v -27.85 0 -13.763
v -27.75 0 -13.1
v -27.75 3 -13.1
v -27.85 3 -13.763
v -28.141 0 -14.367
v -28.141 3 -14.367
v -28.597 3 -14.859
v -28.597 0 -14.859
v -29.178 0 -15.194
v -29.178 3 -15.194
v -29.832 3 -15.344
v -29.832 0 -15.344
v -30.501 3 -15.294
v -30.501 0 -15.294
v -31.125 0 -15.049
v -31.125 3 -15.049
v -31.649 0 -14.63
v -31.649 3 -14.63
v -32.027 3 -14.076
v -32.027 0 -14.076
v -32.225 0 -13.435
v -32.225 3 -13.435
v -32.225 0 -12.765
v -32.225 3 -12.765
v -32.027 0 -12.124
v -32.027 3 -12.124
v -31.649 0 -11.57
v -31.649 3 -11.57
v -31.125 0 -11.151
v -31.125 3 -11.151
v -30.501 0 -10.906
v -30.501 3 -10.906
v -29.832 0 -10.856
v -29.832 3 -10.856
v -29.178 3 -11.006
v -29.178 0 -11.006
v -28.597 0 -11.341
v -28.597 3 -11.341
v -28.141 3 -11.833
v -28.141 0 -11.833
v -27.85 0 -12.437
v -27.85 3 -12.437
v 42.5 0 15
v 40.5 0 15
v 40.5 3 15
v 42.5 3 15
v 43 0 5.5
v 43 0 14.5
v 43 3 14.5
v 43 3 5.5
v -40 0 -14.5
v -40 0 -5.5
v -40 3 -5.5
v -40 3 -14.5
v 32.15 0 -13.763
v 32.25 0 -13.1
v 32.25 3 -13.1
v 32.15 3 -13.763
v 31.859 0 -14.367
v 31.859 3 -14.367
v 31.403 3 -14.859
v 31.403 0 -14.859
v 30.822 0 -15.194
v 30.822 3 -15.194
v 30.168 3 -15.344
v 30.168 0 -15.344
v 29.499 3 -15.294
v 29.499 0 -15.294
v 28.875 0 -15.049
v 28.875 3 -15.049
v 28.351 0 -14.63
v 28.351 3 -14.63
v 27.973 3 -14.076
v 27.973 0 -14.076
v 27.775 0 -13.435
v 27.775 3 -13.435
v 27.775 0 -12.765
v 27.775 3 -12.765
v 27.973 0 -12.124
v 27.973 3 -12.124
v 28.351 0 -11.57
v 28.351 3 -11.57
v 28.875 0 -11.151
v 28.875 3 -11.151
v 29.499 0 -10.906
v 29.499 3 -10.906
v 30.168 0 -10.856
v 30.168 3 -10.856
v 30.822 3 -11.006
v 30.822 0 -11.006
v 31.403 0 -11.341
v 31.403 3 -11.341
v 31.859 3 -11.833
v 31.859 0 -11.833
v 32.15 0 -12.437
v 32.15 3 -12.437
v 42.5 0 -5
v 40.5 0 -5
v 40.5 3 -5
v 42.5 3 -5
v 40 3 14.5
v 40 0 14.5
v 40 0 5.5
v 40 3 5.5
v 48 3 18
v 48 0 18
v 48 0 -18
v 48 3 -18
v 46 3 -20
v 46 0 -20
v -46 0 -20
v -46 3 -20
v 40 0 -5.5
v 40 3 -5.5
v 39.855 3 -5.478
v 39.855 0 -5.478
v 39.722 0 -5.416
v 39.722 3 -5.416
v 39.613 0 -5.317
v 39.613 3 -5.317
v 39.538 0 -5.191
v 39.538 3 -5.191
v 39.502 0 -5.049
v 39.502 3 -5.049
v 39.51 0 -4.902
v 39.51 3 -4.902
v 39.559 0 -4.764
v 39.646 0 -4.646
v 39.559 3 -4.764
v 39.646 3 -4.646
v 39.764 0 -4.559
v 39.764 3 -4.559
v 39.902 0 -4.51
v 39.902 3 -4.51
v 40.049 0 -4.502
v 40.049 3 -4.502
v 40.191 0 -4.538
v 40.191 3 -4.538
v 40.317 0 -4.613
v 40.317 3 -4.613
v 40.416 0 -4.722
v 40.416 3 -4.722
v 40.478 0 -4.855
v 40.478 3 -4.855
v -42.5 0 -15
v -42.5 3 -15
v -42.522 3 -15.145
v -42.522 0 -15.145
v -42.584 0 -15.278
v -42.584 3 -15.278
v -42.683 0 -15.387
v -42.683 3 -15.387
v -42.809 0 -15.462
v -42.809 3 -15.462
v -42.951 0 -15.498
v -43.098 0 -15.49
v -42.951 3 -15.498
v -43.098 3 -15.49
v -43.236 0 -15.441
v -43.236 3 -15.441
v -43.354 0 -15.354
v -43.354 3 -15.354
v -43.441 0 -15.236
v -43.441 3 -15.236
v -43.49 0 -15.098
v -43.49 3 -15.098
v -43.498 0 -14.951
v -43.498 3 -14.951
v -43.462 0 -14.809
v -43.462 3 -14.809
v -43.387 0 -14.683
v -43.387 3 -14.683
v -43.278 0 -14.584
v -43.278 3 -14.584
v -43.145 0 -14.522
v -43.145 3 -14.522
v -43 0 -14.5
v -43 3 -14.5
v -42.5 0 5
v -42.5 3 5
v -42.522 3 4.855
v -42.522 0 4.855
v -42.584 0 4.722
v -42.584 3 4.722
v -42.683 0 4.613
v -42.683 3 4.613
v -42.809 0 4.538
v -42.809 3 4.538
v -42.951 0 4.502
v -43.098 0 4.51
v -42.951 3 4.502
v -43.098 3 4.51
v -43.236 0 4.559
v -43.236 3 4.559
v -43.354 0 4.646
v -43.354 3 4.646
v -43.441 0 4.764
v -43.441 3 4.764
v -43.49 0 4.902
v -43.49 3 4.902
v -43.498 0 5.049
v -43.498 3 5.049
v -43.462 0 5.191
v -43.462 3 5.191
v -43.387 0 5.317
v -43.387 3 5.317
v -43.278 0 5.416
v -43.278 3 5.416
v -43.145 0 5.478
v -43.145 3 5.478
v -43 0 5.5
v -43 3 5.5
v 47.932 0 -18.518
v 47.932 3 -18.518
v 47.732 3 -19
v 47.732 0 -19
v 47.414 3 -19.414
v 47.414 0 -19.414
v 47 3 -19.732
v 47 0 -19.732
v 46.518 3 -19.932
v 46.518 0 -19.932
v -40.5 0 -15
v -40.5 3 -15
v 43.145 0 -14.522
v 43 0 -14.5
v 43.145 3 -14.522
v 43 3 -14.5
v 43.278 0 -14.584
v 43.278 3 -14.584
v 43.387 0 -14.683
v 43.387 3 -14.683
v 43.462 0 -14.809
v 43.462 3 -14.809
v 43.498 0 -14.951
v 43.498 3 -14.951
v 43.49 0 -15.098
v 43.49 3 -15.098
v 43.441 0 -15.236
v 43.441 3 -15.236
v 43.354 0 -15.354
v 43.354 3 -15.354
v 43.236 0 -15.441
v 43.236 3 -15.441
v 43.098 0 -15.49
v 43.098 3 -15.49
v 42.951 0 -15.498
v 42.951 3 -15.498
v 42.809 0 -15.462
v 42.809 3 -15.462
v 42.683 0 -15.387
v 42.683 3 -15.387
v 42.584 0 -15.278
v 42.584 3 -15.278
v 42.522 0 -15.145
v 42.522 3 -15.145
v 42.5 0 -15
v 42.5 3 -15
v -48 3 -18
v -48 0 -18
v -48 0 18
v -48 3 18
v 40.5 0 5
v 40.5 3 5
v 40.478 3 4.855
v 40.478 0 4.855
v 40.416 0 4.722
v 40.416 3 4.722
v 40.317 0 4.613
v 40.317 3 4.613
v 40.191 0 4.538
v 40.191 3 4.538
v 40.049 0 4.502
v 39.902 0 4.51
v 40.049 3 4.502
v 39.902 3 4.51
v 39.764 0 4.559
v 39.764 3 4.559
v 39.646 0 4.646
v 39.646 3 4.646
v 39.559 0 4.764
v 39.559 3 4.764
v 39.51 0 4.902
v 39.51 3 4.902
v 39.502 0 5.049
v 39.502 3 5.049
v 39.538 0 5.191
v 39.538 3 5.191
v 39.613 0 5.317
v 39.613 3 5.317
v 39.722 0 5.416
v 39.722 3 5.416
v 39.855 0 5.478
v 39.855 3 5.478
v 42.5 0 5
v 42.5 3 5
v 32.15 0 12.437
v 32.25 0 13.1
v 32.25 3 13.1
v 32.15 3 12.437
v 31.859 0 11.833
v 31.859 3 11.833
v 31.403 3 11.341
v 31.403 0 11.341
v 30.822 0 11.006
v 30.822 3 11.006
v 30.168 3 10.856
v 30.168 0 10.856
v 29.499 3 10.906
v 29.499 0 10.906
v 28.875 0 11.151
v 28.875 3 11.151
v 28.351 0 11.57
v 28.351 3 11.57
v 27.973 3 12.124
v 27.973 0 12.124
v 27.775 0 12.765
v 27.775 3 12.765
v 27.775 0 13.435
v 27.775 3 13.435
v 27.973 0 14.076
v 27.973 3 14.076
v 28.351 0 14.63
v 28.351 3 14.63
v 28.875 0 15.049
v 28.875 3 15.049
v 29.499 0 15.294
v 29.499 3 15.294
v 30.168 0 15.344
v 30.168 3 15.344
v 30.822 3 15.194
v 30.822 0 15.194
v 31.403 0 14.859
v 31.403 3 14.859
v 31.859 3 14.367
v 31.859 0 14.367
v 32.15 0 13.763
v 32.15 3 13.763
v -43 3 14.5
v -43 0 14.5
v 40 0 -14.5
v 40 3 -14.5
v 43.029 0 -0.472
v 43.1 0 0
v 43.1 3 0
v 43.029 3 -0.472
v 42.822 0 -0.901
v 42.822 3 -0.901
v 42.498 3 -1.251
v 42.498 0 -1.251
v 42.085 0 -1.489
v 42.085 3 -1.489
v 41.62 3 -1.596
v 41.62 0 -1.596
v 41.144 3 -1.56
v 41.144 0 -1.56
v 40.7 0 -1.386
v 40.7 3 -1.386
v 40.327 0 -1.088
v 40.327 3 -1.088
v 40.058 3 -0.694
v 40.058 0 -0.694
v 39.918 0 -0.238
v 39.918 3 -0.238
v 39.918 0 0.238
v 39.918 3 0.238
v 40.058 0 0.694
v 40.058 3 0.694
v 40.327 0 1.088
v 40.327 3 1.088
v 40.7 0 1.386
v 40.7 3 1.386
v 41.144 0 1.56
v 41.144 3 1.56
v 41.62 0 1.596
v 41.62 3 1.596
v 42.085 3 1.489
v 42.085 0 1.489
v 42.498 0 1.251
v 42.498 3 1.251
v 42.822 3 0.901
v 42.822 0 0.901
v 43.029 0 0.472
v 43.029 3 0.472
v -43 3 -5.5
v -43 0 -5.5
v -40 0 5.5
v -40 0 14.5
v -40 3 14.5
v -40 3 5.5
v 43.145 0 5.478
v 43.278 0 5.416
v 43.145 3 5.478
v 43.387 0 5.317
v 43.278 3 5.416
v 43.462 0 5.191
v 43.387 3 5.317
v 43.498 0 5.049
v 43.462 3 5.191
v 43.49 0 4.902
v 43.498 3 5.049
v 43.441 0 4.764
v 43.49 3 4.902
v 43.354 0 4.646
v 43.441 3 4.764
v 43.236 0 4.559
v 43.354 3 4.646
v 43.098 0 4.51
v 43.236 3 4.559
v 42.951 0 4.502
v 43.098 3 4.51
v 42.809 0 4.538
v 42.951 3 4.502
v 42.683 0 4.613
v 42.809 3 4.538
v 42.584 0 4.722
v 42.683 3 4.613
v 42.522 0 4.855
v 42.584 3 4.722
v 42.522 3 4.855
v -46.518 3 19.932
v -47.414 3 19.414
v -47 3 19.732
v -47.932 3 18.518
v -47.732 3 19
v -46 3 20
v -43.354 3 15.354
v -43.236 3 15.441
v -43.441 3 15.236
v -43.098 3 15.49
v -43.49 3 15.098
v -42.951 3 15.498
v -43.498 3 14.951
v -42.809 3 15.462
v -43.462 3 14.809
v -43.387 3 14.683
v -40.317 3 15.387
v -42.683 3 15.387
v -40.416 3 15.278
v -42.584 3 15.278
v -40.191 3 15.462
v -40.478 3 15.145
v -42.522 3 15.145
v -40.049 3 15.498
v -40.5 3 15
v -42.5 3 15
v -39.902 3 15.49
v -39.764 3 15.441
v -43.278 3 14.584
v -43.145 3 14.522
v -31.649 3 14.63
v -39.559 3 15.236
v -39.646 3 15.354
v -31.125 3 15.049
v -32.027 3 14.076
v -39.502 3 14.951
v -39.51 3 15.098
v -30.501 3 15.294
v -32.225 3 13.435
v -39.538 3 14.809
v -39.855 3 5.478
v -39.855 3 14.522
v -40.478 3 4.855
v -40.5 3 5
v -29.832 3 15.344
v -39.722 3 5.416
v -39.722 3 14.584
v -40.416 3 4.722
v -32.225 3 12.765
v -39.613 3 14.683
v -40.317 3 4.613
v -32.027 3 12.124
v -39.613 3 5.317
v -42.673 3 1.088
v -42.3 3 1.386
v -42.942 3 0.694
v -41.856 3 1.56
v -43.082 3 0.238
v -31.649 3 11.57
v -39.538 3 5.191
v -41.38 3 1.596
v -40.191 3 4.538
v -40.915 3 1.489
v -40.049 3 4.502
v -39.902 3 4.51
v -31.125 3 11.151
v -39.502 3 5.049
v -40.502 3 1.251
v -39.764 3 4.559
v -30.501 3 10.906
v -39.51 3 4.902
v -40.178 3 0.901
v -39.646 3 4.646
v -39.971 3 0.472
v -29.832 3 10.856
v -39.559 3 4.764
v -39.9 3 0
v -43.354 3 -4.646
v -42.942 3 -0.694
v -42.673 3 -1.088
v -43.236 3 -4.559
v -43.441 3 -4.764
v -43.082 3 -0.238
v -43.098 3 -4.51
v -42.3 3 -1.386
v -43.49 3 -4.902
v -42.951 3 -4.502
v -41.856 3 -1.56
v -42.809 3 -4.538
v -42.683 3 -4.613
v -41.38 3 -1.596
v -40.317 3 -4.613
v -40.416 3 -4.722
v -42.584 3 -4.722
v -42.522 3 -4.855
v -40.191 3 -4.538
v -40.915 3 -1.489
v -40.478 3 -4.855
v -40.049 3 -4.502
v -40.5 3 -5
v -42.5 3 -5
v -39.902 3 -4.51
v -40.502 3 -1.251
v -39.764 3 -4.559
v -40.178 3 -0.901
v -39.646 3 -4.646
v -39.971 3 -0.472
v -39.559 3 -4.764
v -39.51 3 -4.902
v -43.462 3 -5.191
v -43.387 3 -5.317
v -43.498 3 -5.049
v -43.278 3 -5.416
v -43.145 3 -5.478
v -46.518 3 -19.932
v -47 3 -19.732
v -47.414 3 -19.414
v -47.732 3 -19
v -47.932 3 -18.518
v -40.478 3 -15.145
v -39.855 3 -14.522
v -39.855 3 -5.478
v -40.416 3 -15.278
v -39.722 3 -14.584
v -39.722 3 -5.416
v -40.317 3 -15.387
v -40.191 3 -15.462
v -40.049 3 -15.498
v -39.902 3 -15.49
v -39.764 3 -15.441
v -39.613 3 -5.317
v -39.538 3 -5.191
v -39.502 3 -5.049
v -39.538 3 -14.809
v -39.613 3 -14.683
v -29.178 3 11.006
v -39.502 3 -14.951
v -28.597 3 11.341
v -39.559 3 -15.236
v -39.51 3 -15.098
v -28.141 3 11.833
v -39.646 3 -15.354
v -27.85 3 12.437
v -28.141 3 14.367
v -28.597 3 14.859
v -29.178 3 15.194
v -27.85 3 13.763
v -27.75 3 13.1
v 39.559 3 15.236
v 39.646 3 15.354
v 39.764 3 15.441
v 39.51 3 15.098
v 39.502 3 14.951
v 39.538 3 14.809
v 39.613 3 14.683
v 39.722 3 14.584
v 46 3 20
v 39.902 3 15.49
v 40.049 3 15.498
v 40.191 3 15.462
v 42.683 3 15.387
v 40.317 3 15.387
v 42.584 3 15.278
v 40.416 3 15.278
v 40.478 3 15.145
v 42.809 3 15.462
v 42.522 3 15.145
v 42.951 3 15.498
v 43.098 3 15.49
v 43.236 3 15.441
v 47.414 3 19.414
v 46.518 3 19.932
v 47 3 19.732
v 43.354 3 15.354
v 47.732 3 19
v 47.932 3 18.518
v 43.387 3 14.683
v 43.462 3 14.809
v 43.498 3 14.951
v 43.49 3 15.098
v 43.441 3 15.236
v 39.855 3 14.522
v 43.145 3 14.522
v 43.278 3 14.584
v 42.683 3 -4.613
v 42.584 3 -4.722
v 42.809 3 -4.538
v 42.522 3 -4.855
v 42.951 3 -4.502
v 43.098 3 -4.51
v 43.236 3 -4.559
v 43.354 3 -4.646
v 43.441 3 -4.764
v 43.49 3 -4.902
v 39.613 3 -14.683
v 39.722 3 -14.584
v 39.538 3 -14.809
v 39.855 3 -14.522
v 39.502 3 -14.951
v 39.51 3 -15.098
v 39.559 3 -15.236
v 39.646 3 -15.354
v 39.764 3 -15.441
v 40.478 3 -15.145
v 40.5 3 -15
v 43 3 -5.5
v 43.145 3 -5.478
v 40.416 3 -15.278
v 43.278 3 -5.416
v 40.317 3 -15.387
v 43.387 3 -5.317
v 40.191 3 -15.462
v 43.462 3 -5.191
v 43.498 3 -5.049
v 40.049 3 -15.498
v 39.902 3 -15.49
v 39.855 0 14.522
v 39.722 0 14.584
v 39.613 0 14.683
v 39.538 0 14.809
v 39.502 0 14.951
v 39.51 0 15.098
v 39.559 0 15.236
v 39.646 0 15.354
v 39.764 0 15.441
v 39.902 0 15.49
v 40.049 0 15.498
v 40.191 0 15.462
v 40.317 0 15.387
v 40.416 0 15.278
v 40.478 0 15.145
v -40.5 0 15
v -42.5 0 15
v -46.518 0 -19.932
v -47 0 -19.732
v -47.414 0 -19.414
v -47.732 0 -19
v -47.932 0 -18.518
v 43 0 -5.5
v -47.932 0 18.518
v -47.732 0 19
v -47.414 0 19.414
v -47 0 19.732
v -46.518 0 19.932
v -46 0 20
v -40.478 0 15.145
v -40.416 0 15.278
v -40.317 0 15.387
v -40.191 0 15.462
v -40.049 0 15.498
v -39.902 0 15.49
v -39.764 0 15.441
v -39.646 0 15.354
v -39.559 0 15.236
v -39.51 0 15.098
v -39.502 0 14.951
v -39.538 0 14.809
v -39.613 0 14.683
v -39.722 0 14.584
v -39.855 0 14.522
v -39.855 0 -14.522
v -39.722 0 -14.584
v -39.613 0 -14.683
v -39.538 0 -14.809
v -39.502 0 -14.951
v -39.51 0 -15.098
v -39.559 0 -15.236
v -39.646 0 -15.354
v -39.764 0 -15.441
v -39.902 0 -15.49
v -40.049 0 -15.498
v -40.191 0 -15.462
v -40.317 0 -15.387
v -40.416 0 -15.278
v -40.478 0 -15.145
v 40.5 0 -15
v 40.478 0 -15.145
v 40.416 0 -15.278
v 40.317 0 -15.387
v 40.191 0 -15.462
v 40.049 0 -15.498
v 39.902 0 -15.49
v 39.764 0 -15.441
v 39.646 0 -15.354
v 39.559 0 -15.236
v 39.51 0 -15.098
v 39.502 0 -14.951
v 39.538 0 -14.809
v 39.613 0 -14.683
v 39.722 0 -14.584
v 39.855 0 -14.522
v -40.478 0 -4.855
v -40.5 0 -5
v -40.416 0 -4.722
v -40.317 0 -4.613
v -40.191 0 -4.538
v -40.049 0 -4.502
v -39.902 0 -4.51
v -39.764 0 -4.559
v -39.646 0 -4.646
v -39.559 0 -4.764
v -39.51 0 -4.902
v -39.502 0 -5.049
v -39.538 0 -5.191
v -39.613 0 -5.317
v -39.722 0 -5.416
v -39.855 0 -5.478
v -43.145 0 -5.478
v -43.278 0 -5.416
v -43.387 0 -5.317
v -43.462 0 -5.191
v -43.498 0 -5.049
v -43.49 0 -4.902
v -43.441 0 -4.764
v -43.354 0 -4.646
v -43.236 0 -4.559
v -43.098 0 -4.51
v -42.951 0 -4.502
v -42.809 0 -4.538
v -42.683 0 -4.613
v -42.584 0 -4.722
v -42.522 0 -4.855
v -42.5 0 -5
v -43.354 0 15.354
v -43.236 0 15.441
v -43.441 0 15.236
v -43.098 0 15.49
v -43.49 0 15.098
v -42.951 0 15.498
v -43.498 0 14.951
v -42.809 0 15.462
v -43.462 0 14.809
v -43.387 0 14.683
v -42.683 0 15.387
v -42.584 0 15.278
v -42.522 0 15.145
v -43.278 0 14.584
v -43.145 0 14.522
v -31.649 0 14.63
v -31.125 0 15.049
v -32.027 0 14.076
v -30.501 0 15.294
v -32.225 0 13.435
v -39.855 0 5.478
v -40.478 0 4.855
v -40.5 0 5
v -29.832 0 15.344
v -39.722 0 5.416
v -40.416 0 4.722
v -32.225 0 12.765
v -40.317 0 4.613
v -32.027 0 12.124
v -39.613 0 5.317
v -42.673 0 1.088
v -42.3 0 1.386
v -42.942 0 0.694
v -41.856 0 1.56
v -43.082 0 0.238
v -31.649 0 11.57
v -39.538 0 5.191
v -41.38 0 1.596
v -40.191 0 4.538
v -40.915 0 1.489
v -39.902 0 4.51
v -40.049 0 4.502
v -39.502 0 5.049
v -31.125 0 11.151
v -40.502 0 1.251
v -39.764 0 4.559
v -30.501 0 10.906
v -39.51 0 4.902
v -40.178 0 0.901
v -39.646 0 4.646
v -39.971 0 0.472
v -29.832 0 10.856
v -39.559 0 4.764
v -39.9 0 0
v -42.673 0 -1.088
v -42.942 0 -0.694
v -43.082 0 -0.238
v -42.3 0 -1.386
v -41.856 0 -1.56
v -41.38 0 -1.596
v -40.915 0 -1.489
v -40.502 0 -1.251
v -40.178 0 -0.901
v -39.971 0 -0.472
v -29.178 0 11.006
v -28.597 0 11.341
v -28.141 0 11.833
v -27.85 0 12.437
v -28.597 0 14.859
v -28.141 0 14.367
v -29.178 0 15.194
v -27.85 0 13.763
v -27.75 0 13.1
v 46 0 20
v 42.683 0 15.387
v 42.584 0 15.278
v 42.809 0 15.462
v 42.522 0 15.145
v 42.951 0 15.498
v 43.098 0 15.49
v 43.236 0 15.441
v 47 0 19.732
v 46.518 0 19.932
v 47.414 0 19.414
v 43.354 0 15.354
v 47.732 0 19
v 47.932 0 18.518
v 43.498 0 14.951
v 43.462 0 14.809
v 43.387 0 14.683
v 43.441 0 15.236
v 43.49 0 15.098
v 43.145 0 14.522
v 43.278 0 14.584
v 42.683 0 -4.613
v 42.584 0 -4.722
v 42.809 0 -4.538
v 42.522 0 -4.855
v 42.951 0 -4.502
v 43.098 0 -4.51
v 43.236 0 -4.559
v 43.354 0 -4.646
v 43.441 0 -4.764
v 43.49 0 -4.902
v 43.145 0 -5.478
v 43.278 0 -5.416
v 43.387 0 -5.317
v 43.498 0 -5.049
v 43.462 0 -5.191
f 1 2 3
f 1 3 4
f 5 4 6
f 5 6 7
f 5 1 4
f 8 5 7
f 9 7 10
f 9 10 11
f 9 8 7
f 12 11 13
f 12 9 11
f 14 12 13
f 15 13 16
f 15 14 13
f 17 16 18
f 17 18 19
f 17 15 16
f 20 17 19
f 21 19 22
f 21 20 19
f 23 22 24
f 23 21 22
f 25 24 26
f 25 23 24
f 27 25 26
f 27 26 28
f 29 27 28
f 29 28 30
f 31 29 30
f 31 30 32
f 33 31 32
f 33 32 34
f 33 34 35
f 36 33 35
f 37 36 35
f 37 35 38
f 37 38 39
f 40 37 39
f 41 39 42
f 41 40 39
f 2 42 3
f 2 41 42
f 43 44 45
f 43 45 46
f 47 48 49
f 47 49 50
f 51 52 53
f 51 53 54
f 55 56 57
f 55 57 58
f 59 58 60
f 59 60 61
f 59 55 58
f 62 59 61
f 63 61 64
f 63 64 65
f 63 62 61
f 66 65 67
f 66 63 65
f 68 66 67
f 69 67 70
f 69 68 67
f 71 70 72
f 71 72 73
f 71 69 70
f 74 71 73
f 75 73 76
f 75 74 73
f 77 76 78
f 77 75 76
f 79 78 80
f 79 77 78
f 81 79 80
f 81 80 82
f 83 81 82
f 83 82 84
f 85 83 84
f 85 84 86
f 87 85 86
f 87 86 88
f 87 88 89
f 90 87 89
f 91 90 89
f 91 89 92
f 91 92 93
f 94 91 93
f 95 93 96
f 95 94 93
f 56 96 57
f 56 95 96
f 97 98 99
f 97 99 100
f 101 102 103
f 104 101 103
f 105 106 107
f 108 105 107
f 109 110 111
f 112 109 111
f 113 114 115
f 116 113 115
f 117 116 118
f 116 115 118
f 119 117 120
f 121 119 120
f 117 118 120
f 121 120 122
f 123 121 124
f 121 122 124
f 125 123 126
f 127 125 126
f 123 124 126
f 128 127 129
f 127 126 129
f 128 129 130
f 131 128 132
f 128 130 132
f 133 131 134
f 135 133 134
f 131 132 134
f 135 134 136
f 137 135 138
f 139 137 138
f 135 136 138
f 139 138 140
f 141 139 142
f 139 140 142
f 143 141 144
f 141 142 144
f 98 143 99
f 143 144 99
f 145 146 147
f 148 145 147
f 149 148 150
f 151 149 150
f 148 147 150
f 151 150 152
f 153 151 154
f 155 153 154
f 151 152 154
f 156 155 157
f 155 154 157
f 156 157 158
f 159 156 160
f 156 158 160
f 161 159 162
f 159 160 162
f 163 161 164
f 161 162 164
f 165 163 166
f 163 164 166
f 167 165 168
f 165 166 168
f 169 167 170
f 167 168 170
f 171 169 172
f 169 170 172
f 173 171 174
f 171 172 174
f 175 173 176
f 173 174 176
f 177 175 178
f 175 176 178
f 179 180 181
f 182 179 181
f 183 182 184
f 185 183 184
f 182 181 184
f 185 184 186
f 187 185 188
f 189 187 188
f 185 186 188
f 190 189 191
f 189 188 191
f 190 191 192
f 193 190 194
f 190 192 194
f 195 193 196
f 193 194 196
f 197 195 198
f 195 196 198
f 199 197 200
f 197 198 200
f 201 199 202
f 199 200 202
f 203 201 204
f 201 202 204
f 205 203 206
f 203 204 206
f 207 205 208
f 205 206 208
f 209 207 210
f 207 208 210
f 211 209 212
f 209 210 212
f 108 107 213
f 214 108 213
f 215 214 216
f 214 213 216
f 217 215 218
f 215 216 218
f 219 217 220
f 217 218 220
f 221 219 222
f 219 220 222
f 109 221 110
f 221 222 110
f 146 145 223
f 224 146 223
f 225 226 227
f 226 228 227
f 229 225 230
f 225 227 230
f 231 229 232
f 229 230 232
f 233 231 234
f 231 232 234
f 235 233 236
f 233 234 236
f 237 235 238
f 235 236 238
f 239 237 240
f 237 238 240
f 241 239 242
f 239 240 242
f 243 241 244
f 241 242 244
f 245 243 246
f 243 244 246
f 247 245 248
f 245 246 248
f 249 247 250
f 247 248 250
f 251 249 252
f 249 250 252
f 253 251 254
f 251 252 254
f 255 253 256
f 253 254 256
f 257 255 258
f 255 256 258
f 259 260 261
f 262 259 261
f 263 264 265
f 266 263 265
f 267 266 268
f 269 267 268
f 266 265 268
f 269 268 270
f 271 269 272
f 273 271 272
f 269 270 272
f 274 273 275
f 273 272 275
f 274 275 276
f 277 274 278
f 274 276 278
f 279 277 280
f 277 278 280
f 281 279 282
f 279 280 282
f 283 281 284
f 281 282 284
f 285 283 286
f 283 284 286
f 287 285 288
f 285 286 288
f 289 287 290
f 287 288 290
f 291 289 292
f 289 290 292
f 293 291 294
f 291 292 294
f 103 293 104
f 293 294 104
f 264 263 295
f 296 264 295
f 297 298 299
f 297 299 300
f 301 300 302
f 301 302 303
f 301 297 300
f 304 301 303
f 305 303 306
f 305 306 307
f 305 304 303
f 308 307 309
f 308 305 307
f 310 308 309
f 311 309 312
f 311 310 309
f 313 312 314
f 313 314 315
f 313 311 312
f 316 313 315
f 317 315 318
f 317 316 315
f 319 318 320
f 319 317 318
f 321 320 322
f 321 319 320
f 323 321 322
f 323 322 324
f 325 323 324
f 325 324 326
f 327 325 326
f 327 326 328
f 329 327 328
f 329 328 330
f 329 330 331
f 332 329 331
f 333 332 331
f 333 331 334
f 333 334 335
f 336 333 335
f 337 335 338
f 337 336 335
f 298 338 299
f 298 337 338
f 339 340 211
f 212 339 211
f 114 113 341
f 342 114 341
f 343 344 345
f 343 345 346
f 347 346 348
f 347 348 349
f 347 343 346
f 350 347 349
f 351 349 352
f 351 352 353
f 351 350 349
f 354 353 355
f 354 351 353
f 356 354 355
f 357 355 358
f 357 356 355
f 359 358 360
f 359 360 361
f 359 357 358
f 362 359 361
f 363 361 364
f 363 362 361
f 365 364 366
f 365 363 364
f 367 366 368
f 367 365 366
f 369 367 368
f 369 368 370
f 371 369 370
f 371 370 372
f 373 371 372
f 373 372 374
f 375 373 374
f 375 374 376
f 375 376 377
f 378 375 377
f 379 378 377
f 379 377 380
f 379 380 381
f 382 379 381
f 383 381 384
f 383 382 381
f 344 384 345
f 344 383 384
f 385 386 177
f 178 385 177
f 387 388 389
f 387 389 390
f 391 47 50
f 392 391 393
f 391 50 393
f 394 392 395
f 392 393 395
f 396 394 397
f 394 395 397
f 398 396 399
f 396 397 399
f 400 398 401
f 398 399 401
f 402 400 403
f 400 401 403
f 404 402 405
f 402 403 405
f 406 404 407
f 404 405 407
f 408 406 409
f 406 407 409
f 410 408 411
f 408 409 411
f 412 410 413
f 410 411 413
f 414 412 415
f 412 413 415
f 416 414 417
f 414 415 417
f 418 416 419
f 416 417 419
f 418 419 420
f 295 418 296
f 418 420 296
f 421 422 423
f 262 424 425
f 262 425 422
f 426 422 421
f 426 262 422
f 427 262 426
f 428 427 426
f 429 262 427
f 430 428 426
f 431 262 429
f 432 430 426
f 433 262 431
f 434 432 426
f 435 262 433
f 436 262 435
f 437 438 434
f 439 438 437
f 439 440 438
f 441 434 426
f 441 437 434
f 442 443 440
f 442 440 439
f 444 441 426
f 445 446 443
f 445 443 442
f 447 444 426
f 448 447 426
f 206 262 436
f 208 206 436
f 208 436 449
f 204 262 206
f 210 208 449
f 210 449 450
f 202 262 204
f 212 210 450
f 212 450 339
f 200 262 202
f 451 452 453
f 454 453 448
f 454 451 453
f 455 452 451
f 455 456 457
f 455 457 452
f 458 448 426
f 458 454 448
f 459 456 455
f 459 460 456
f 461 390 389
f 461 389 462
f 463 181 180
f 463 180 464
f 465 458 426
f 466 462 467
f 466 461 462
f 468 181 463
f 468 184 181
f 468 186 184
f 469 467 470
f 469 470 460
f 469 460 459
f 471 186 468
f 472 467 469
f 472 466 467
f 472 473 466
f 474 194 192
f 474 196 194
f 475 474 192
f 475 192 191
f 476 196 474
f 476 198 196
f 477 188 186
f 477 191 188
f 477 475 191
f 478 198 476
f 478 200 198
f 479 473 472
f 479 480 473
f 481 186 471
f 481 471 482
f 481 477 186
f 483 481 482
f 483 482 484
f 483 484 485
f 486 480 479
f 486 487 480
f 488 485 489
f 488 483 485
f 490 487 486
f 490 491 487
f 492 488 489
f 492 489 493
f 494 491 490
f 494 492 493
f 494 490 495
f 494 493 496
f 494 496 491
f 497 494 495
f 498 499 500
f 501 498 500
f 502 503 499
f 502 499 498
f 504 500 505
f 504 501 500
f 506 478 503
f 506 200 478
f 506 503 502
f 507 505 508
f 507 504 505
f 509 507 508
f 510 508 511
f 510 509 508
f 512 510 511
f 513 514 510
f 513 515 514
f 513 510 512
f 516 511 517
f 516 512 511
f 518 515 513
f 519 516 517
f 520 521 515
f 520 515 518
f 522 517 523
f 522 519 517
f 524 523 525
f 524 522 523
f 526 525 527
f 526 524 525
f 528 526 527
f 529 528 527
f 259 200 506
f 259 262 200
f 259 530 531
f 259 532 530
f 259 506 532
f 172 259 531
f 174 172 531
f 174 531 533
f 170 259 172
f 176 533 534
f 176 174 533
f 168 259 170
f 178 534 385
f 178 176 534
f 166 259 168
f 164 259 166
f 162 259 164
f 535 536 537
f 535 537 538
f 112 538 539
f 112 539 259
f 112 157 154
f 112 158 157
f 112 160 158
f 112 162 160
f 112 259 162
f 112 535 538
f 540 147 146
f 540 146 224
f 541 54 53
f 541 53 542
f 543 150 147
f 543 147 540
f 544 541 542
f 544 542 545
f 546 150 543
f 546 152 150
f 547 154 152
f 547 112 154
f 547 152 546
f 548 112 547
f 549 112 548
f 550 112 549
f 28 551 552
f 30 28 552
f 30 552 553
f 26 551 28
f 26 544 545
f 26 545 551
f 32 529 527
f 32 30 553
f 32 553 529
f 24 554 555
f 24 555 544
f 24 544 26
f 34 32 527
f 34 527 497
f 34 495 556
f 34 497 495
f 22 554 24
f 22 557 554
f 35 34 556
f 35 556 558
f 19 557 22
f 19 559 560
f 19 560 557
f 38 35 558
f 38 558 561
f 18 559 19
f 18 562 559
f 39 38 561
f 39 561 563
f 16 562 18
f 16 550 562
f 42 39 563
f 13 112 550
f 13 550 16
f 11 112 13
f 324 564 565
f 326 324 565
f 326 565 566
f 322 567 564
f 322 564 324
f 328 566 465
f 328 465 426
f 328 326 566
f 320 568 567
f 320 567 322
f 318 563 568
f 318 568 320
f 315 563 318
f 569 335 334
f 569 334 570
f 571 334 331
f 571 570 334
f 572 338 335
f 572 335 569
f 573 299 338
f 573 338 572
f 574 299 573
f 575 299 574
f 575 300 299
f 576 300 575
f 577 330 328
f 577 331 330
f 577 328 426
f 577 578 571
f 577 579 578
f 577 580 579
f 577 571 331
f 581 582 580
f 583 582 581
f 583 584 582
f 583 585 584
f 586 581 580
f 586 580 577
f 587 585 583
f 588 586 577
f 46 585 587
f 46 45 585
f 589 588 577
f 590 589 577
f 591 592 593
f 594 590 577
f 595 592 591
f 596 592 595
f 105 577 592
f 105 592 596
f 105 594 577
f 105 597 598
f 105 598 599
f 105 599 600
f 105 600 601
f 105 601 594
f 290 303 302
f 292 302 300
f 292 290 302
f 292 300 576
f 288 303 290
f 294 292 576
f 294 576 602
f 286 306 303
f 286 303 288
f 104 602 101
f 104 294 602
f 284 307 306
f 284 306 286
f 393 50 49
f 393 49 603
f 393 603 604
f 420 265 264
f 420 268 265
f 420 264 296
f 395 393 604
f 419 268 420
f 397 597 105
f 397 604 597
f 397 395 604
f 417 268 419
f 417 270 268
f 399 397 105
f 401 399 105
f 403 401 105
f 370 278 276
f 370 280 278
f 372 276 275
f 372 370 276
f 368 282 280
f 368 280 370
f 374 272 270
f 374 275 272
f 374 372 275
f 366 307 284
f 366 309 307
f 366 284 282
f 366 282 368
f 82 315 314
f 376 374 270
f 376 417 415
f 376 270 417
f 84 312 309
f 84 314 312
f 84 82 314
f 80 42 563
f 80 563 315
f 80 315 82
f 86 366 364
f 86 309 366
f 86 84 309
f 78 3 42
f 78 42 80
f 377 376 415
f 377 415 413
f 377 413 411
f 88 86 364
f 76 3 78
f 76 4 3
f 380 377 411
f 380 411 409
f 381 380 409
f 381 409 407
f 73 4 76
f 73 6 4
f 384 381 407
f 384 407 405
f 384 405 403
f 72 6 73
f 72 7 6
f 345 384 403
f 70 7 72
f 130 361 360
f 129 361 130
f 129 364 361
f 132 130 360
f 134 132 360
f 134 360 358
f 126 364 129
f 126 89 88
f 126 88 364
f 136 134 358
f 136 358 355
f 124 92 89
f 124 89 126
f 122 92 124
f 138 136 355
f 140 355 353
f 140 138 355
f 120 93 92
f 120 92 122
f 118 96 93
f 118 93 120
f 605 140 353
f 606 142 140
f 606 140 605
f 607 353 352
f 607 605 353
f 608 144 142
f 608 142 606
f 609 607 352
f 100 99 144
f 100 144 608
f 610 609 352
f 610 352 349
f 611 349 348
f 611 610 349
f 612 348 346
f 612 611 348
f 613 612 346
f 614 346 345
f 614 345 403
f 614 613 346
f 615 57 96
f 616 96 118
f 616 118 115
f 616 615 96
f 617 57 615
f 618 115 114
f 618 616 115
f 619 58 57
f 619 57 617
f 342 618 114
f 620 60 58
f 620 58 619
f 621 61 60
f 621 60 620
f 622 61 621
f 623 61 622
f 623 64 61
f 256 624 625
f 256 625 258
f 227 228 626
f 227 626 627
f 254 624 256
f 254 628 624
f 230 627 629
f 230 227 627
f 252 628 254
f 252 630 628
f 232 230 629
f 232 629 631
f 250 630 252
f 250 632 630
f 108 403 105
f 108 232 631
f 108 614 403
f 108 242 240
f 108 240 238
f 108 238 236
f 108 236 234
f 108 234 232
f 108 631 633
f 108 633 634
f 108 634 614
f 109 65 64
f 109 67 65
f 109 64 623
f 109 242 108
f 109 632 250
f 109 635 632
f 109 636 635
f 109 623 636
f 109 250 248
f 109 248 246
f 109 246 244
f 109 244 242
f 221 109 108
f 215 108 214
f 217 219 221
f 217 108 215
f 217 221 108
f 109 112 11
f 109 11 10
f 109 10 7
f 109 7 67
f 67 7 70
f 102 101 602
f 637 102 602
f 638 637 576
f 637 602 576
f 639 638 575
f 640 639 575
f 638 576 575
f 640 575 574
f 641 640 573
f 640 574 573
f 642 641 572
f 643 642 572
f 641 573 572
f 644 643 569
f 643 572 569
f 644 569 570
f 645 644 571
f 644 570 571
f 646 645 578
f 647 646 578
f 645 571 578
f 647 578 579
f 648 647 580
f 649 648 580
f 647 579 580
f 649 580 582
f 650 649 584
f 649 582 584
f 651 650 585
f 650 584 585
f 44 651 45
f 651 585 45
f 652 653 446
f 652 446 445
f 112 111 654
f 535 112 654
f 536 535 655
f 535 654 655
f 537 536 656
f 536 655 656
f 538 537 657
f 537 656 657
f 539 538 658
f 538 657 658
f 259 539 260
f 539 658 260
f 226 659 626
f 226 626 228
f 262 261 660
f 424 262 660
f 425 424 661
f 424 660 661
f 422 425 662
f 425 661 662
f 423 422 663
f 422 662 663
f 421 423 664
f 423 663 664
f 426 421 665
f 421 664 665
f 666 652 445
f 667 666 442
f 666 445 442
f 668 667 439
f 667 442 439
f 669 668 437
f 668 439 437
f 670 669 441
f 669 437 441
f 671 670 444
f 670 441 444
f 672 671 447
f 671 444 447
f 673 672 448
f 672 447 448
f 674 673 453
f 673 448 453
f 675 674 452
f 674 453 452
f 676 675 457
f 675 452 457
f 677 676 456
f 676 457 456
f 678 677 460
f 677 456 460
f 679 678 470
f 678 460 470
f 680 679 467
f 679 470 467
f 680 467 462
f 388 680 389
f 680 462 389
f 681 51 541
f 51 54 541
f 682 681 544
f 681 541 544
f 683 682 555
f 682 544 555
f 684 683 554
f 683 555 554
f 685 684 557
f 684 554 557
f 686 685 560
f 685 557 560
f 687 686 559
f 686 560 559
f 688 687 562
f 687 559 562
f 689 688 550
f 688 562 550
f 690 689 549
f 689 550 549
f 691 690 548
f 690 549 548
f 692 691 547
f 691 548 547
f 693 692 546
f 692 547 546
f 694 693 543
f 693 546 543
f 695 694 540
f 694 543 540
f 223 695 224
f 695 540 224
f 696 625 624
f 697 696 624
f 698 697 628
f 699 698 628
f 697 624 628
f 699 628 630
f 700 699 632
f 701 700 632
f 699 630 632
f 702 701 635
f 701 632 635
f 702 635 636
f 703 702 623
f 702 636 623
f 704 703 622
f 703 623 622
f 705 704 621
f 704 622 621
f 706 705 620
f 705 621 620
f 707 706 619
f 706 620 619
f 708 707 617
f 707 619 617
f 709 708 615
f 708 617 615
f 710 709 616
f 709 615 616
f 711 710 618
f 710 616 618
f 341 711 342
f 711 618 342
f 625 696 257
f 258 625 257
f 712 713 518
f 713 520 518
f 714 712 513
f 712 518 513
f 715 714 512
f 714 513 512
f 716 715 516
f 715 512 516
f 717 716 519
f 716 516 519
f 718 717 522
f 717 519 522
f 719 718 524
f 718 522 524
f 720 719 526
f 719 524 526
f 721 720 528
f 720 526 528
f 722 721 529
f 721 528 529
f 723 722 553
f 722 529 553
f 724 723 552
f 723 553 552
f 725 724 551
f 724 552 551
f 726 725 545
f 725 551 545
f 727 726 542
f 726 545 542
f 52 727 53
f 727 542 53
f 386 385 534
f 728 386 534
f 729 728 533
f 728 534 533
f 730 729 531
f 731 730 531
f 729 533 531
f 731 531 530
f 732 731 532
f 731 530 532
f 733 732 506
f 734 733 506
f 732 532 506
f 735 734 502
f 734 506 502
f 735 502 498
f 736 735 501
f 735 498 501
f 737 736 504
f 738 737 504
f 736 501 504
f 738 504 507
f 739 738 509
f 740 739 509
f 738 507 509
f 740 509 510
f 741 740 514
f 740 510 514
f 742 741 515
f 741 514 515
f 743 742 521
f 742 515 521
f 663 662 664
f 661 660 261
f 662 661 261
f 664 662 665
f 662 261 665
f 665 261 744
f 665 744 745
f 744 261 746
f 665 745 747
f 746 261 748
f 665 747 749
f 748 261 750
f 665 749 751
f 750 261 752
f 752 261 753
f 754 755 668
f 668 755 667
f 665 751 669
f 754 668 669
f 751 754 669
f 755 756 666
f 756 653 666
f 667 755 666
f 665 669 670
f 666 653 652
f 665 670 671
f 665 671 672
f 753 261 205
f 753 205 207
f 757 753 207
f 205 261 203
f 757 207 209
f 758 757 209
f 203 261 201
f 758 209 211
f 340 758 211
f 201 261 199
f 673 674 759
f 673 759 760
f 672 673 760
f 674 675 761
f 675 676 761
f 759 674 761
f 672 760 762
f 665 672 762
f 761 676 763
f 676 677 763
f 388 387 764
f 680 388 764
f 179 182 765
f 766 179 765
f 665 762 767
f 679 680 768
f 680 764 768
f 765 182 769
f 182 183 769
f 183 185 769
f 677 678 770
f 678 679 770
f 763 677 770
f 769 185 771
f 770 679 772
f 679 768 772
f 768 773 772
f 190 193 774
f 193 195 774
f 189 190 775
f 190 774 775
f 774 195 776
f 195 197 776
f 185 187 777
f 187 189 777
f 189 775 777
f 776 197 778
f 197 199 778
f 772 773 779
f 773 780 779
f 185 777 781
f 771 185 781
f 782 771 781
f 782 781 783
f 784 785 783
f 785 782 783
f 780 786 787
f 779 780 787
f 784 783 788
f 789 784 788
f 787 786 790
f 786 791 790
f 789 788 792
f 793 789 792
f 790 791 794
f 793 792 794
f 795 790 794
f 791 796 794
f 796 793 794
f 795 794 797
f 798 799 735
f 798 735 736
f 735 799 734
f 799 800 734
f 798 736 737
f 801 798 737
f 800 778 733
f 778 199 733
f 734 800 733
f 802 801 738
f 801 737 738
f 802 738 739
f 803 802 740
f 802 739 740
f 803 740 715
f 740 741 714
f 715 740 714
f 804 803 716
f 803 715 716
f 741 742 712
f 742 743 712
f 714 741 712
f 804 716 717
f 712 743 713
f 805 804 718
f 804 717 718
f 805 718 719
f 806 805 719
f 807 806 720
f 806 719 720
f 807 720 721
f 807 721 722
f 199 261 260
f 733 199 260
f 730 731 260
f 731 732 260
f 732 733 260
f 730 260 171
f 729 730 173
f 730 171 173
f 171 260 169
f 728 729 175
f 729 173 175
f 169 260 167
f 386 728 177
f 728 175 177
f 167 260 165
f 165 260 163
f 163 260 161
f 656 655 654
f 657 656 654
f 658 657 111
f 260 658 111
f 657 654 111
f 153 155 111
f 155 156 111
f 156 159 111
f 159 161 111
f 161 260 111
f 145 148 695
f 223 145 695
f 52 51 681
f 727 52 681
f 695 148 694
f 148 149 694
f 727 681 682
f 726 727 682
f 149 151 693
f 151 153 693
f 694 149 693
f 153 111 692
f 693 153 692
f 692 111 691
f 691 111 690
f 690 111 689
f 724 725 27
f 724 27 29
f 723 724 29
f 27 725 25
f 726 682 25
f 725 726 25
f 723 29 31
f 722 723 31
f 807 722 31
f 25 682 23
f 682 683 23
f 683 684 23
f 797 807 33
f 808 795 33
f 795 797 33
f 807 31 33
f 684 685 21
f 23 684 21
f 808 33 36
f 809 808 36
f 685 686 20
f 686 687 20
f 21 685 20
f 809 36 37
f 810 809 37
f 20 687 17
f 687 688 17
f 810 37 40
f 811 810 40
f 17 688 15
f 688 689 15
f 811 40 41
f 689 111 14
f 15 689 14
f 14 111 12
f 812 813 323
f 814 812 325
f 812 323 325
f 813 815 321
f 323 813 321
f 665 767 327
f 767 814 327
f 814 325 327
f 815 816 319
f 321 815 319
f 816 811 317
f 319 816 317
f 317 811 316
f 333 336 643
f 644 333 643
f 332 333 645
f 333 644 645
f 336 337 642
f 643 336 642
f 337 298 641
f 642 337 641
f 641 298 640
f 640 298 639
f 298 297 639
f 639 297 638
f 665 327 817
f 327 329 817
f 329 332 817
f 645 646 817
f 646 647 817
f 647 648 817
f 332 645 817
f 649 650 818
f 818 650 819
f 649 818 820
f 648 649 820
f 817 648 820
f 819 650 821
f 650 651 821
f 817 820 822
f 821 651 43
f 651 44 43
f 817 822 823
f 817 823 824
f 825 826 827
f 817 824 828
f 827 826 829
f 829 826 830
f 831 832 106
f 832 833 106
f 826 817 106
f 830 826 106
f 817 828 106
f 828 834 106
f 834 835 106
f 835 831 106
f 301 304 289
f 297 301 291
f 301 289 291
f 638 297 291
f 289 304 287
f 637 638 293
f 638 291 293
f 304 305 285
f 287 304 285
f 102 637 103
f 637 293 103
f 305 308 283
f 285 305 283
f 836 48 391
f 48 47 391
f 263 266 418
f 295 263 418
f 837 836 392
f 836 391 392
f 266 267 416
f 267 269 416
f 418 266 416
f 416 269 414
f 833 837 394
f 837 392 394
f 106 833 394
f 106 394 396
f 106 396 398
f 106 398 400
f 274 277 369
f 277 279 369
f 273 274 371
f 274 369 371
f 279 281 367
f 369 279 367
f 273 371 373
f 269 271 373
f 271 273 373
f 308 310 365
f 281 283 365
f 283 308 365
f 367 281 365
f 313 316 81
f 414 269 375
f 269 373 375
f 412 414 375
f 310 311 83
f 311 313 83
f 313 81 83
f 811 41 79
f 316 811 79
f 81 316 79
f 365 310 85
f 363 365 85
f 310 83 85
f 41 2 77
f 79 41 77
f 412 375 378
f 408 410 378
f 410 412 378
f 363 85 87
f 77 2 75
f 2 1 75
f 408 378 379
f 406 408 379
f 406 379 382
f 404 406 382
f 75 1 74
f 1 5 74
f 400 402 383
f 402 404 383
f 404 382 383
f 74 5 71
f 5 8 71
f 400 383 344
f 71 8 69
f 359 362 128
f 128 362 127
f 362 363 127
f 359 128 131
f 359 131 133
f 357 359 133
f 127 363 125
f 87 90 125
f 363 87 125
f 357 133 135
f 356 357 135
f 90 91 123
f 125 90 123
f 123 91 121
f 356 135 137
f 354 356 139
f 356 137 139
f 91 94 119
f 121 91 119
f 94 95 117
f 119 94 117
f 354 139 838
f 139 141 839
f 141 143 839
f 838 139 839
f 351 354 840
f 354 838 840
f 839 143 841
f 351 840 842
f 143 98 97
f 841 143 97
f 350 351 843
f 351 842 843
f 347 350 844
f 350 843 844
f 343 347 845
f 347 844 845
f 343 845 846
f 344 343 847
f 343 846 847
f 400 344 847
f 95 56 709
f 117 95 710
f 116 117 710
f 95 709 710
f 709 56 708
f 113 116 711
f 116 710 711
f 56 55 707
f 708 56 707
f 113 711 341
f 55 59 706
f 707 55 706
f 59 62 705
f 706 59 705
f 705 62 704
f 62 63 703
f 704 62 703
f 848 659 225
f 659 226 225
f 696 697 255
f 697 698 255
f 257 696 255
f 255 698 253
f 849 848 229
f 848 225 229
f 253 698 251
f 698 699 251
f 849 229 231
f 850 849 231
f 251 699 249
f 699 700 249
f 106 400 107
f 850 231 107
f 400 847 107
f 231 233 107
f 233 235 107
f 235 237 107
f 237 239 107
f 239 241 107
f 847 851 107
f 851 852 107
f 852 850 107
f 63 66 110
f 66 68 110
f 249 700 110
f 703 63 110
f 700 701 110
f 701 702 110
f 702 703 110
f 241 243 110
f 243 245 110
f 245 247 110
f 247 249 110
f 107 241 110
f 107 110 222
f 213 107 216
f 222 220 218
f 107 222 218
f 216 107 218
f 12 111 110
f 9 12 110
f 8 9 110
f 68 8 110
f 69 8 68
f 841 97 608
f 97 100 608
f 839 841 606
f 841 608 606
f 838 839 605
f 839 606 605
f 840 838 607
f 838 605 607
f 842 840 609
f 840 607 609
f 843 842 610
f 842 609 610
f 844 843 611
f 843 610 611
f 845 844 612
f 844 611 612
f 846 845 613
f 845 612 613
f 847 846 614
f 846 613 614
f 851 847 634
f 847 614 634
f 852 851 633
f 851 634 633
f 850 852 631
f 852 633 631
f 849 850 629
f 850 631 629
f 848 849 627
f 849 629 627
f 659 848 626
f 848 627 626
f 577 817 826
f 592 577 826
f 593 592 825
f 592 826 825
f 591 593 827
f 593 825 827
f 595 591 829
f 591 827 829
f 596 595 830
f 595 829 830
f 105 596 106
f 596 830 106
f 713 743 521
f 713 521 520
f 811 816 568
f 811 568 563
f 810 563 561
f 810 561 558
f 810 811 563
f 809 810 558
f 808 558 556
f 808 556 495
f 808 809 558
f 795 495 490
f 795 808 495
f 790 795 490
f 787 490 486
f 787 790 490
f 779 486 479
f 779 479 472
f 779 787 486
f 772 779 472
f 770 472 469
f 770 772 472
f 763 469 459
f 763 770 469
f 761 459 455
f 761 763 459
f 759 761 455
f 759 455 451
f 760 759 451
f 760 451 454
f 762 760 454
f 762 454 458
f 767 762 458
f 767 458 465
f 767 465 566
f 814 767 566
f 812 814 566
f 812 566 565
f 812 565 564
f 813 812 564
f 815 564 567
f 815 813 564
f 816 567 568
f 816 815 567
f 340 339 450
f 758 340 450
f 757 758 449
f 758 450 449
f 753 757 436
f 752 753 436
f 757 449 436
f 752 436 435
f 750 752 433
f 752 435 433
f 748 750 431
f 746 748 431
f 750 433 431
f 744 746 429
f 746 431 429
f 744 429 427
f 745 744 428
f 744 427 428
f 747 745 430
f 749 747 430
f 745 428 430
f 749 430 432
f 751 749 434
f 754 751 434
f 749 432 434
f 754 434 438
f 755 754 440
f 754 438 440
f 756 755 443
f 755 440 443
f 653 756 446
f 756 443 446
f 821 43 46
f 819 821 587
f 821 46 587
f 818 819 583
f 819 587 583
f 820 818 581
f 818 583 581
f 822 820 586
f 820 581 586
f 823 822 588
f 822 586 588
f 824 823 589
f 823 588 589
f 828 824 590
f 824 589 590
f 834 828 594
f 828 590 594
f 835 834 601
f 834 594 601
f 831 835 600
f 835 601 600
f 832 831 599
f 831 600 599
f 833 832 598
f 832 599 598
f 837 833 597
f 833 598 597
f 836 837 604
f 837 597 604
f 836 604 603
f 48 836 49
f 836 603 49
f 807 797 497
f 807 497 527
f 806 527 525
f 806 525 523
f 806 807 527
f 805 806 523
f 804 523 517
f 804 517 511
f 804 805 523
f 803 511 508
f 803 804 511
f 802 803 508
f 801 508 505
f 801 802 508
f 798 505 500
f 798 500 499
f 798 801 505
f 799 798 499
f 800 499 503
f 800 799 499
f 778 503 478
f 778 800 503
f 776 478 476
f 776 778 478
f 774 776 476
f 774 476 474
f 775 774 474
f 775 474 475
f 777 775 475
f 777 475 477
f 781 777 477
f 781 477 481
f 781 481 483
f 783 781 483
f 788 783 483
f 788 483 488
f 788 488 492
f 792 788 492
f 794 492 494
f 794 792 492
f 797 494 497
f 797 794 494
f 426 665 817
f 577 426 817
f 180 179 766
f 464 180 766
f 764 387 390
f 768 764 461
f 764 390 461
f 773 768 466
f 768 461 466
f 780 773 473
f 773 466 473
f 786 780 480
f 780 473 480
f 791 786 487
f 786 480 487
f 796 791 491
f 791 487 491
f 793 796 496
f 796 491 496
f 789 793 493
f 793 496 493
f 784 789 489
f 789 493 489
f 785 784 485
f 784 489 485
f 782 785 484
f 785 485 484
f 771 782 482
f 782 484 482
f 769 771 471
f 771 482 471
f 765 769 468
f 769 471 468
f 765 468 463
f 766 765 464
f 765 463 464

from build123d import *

# Parameters (mm, degrees)
SKETCH1_R           = 2.25
SKETCH1_R_2         = 1.6
SKETCH1_W           = 3
SKETCH1_H           = 10
BOSS_EXTRUDE1_DEPTH = 3
SKETCH2_R           = 0.5
CUT_EXTRUDE1_DEPTH  = 4


with BuildPart() as part:
    # Sketch1 → Boss-Extrude1 (new body)
    with BuildSketch(Plane(origin=(0, 0, 0), x_dir=(1, 0, 0), z_dir=(0, 1, 0))):
        with BuildLine():
            Line((-46, -20), (46, -20))
            ThreePointArc((46, -20), (47.414213562, -19.414213562), (48, -18))
            Line((48, -18), (48, 18))
            ThreePointArc((48, 18), (47.414213562, 19.414213562), (46, 20))
            Line((46, 20), (-46, 20))
            ThreePointArc((-46, 20), (-47.414213562, 19.414213562), (-48, 18))
            Line((-48, 18), (-48, -18))
            ThreePointArc((-48, -18), (-47.414213562, -19.414213562), (-46, -20))
        make_face()
        with Locations((-30, 13.1)):
            Circle(SKETCH1_R, mode=Mode.SUBTRACT)
        with Locations((30, 13.1)):
            Circle(SKETCH1_R, mode=Mode.SUBTRACT)
        with Locations((30, -13.1)):
            Circle(SKETCH1_R, mode=Mode.SUBTRACT)
        with Locations((-30, -13.1)):
            Circle(SKETCH1_R, mode=Mode.SUBTRACT)
        with Locations((41.5, 0)):
            Circle(SKETCH1_R_2, mode=Mode.SUBTRACT)
        with Locations((-41.5, 0)):
            Circle(SKETCH1_R_2, mode=Mode.SUBTRACT)
        with Locations((-41.5, 10)):
            Rectangle(SKETCH1_W, SKETCH1_H, mode=Mode.SUBTRACT)
        with Locations((-41.5, -10)):
            Rectangle(SKETCH1_W, SKETCH1_H, mode=Mode.SUBTRACT)
        with Locations((41.5, 10)):
            Rectangle(SKETCH1_W, SKETCH1_H, mode=Mode.SUBTRACT)
        with Locations((41.5, -10)):
            Rectangle(SKETCH1_W, SKETCH1_H, mode=Mode.SUBTRACT)
    extrude(amount=BOSS_EXTRUDE1_DEPTH)

    # Sketch2 → Cut-Extrude1 (cut, through all)
    with BuildSketch(Plane(origin=(0, 3, 0), x_dir=(1, 0, 0), z_dir=(0, 1, 0))):
        with Locations((-43, 15)):
            Circle(SKETCH2_R)
        with Locations((-40, 15)):
            Circle(SKETCH2_R)
        with Locations((-40, 5)):
            Circle(SKETCH2_R)
        with Locations((-43, 5)):
            Circle(SKETCH2_R)
        with Locations((-43, -5)):
            Circle(SKETCH2_R)
        with Locations((-40, -5)):
            Circle(SKETCH2_R)
        with Locations((-43, -15)):
            Circle(SKETCH2_R)
        with Locations((-40, -15)):
            Circle(SKETCH2_R)
        with Locations((40, -15)):
            Circle(SKETCH2_R)
        with Locations((43, -15)):
            Circle(SKETCH2_R)
        with Locations((43, -5)):
            Circle(SKETCH2_R)
        with Locations((40, -5)):
            Circle(SKETCH2_R)
        with Locations((40, 5)):
            Circle(SKETCH2_R)
        with Locations((43, 5)):
            Circle(SKETCH2_R)
        with Locations((43, 15)):
            Circle(SKETCH2_R)
        with Locations((40, 15)):
            Circle(SKETCH2_R)
    extrude(amount=-CUT_EXTRUDE1_DEPTH, mode=Mode.SUBTRACT)


solid = part.part
